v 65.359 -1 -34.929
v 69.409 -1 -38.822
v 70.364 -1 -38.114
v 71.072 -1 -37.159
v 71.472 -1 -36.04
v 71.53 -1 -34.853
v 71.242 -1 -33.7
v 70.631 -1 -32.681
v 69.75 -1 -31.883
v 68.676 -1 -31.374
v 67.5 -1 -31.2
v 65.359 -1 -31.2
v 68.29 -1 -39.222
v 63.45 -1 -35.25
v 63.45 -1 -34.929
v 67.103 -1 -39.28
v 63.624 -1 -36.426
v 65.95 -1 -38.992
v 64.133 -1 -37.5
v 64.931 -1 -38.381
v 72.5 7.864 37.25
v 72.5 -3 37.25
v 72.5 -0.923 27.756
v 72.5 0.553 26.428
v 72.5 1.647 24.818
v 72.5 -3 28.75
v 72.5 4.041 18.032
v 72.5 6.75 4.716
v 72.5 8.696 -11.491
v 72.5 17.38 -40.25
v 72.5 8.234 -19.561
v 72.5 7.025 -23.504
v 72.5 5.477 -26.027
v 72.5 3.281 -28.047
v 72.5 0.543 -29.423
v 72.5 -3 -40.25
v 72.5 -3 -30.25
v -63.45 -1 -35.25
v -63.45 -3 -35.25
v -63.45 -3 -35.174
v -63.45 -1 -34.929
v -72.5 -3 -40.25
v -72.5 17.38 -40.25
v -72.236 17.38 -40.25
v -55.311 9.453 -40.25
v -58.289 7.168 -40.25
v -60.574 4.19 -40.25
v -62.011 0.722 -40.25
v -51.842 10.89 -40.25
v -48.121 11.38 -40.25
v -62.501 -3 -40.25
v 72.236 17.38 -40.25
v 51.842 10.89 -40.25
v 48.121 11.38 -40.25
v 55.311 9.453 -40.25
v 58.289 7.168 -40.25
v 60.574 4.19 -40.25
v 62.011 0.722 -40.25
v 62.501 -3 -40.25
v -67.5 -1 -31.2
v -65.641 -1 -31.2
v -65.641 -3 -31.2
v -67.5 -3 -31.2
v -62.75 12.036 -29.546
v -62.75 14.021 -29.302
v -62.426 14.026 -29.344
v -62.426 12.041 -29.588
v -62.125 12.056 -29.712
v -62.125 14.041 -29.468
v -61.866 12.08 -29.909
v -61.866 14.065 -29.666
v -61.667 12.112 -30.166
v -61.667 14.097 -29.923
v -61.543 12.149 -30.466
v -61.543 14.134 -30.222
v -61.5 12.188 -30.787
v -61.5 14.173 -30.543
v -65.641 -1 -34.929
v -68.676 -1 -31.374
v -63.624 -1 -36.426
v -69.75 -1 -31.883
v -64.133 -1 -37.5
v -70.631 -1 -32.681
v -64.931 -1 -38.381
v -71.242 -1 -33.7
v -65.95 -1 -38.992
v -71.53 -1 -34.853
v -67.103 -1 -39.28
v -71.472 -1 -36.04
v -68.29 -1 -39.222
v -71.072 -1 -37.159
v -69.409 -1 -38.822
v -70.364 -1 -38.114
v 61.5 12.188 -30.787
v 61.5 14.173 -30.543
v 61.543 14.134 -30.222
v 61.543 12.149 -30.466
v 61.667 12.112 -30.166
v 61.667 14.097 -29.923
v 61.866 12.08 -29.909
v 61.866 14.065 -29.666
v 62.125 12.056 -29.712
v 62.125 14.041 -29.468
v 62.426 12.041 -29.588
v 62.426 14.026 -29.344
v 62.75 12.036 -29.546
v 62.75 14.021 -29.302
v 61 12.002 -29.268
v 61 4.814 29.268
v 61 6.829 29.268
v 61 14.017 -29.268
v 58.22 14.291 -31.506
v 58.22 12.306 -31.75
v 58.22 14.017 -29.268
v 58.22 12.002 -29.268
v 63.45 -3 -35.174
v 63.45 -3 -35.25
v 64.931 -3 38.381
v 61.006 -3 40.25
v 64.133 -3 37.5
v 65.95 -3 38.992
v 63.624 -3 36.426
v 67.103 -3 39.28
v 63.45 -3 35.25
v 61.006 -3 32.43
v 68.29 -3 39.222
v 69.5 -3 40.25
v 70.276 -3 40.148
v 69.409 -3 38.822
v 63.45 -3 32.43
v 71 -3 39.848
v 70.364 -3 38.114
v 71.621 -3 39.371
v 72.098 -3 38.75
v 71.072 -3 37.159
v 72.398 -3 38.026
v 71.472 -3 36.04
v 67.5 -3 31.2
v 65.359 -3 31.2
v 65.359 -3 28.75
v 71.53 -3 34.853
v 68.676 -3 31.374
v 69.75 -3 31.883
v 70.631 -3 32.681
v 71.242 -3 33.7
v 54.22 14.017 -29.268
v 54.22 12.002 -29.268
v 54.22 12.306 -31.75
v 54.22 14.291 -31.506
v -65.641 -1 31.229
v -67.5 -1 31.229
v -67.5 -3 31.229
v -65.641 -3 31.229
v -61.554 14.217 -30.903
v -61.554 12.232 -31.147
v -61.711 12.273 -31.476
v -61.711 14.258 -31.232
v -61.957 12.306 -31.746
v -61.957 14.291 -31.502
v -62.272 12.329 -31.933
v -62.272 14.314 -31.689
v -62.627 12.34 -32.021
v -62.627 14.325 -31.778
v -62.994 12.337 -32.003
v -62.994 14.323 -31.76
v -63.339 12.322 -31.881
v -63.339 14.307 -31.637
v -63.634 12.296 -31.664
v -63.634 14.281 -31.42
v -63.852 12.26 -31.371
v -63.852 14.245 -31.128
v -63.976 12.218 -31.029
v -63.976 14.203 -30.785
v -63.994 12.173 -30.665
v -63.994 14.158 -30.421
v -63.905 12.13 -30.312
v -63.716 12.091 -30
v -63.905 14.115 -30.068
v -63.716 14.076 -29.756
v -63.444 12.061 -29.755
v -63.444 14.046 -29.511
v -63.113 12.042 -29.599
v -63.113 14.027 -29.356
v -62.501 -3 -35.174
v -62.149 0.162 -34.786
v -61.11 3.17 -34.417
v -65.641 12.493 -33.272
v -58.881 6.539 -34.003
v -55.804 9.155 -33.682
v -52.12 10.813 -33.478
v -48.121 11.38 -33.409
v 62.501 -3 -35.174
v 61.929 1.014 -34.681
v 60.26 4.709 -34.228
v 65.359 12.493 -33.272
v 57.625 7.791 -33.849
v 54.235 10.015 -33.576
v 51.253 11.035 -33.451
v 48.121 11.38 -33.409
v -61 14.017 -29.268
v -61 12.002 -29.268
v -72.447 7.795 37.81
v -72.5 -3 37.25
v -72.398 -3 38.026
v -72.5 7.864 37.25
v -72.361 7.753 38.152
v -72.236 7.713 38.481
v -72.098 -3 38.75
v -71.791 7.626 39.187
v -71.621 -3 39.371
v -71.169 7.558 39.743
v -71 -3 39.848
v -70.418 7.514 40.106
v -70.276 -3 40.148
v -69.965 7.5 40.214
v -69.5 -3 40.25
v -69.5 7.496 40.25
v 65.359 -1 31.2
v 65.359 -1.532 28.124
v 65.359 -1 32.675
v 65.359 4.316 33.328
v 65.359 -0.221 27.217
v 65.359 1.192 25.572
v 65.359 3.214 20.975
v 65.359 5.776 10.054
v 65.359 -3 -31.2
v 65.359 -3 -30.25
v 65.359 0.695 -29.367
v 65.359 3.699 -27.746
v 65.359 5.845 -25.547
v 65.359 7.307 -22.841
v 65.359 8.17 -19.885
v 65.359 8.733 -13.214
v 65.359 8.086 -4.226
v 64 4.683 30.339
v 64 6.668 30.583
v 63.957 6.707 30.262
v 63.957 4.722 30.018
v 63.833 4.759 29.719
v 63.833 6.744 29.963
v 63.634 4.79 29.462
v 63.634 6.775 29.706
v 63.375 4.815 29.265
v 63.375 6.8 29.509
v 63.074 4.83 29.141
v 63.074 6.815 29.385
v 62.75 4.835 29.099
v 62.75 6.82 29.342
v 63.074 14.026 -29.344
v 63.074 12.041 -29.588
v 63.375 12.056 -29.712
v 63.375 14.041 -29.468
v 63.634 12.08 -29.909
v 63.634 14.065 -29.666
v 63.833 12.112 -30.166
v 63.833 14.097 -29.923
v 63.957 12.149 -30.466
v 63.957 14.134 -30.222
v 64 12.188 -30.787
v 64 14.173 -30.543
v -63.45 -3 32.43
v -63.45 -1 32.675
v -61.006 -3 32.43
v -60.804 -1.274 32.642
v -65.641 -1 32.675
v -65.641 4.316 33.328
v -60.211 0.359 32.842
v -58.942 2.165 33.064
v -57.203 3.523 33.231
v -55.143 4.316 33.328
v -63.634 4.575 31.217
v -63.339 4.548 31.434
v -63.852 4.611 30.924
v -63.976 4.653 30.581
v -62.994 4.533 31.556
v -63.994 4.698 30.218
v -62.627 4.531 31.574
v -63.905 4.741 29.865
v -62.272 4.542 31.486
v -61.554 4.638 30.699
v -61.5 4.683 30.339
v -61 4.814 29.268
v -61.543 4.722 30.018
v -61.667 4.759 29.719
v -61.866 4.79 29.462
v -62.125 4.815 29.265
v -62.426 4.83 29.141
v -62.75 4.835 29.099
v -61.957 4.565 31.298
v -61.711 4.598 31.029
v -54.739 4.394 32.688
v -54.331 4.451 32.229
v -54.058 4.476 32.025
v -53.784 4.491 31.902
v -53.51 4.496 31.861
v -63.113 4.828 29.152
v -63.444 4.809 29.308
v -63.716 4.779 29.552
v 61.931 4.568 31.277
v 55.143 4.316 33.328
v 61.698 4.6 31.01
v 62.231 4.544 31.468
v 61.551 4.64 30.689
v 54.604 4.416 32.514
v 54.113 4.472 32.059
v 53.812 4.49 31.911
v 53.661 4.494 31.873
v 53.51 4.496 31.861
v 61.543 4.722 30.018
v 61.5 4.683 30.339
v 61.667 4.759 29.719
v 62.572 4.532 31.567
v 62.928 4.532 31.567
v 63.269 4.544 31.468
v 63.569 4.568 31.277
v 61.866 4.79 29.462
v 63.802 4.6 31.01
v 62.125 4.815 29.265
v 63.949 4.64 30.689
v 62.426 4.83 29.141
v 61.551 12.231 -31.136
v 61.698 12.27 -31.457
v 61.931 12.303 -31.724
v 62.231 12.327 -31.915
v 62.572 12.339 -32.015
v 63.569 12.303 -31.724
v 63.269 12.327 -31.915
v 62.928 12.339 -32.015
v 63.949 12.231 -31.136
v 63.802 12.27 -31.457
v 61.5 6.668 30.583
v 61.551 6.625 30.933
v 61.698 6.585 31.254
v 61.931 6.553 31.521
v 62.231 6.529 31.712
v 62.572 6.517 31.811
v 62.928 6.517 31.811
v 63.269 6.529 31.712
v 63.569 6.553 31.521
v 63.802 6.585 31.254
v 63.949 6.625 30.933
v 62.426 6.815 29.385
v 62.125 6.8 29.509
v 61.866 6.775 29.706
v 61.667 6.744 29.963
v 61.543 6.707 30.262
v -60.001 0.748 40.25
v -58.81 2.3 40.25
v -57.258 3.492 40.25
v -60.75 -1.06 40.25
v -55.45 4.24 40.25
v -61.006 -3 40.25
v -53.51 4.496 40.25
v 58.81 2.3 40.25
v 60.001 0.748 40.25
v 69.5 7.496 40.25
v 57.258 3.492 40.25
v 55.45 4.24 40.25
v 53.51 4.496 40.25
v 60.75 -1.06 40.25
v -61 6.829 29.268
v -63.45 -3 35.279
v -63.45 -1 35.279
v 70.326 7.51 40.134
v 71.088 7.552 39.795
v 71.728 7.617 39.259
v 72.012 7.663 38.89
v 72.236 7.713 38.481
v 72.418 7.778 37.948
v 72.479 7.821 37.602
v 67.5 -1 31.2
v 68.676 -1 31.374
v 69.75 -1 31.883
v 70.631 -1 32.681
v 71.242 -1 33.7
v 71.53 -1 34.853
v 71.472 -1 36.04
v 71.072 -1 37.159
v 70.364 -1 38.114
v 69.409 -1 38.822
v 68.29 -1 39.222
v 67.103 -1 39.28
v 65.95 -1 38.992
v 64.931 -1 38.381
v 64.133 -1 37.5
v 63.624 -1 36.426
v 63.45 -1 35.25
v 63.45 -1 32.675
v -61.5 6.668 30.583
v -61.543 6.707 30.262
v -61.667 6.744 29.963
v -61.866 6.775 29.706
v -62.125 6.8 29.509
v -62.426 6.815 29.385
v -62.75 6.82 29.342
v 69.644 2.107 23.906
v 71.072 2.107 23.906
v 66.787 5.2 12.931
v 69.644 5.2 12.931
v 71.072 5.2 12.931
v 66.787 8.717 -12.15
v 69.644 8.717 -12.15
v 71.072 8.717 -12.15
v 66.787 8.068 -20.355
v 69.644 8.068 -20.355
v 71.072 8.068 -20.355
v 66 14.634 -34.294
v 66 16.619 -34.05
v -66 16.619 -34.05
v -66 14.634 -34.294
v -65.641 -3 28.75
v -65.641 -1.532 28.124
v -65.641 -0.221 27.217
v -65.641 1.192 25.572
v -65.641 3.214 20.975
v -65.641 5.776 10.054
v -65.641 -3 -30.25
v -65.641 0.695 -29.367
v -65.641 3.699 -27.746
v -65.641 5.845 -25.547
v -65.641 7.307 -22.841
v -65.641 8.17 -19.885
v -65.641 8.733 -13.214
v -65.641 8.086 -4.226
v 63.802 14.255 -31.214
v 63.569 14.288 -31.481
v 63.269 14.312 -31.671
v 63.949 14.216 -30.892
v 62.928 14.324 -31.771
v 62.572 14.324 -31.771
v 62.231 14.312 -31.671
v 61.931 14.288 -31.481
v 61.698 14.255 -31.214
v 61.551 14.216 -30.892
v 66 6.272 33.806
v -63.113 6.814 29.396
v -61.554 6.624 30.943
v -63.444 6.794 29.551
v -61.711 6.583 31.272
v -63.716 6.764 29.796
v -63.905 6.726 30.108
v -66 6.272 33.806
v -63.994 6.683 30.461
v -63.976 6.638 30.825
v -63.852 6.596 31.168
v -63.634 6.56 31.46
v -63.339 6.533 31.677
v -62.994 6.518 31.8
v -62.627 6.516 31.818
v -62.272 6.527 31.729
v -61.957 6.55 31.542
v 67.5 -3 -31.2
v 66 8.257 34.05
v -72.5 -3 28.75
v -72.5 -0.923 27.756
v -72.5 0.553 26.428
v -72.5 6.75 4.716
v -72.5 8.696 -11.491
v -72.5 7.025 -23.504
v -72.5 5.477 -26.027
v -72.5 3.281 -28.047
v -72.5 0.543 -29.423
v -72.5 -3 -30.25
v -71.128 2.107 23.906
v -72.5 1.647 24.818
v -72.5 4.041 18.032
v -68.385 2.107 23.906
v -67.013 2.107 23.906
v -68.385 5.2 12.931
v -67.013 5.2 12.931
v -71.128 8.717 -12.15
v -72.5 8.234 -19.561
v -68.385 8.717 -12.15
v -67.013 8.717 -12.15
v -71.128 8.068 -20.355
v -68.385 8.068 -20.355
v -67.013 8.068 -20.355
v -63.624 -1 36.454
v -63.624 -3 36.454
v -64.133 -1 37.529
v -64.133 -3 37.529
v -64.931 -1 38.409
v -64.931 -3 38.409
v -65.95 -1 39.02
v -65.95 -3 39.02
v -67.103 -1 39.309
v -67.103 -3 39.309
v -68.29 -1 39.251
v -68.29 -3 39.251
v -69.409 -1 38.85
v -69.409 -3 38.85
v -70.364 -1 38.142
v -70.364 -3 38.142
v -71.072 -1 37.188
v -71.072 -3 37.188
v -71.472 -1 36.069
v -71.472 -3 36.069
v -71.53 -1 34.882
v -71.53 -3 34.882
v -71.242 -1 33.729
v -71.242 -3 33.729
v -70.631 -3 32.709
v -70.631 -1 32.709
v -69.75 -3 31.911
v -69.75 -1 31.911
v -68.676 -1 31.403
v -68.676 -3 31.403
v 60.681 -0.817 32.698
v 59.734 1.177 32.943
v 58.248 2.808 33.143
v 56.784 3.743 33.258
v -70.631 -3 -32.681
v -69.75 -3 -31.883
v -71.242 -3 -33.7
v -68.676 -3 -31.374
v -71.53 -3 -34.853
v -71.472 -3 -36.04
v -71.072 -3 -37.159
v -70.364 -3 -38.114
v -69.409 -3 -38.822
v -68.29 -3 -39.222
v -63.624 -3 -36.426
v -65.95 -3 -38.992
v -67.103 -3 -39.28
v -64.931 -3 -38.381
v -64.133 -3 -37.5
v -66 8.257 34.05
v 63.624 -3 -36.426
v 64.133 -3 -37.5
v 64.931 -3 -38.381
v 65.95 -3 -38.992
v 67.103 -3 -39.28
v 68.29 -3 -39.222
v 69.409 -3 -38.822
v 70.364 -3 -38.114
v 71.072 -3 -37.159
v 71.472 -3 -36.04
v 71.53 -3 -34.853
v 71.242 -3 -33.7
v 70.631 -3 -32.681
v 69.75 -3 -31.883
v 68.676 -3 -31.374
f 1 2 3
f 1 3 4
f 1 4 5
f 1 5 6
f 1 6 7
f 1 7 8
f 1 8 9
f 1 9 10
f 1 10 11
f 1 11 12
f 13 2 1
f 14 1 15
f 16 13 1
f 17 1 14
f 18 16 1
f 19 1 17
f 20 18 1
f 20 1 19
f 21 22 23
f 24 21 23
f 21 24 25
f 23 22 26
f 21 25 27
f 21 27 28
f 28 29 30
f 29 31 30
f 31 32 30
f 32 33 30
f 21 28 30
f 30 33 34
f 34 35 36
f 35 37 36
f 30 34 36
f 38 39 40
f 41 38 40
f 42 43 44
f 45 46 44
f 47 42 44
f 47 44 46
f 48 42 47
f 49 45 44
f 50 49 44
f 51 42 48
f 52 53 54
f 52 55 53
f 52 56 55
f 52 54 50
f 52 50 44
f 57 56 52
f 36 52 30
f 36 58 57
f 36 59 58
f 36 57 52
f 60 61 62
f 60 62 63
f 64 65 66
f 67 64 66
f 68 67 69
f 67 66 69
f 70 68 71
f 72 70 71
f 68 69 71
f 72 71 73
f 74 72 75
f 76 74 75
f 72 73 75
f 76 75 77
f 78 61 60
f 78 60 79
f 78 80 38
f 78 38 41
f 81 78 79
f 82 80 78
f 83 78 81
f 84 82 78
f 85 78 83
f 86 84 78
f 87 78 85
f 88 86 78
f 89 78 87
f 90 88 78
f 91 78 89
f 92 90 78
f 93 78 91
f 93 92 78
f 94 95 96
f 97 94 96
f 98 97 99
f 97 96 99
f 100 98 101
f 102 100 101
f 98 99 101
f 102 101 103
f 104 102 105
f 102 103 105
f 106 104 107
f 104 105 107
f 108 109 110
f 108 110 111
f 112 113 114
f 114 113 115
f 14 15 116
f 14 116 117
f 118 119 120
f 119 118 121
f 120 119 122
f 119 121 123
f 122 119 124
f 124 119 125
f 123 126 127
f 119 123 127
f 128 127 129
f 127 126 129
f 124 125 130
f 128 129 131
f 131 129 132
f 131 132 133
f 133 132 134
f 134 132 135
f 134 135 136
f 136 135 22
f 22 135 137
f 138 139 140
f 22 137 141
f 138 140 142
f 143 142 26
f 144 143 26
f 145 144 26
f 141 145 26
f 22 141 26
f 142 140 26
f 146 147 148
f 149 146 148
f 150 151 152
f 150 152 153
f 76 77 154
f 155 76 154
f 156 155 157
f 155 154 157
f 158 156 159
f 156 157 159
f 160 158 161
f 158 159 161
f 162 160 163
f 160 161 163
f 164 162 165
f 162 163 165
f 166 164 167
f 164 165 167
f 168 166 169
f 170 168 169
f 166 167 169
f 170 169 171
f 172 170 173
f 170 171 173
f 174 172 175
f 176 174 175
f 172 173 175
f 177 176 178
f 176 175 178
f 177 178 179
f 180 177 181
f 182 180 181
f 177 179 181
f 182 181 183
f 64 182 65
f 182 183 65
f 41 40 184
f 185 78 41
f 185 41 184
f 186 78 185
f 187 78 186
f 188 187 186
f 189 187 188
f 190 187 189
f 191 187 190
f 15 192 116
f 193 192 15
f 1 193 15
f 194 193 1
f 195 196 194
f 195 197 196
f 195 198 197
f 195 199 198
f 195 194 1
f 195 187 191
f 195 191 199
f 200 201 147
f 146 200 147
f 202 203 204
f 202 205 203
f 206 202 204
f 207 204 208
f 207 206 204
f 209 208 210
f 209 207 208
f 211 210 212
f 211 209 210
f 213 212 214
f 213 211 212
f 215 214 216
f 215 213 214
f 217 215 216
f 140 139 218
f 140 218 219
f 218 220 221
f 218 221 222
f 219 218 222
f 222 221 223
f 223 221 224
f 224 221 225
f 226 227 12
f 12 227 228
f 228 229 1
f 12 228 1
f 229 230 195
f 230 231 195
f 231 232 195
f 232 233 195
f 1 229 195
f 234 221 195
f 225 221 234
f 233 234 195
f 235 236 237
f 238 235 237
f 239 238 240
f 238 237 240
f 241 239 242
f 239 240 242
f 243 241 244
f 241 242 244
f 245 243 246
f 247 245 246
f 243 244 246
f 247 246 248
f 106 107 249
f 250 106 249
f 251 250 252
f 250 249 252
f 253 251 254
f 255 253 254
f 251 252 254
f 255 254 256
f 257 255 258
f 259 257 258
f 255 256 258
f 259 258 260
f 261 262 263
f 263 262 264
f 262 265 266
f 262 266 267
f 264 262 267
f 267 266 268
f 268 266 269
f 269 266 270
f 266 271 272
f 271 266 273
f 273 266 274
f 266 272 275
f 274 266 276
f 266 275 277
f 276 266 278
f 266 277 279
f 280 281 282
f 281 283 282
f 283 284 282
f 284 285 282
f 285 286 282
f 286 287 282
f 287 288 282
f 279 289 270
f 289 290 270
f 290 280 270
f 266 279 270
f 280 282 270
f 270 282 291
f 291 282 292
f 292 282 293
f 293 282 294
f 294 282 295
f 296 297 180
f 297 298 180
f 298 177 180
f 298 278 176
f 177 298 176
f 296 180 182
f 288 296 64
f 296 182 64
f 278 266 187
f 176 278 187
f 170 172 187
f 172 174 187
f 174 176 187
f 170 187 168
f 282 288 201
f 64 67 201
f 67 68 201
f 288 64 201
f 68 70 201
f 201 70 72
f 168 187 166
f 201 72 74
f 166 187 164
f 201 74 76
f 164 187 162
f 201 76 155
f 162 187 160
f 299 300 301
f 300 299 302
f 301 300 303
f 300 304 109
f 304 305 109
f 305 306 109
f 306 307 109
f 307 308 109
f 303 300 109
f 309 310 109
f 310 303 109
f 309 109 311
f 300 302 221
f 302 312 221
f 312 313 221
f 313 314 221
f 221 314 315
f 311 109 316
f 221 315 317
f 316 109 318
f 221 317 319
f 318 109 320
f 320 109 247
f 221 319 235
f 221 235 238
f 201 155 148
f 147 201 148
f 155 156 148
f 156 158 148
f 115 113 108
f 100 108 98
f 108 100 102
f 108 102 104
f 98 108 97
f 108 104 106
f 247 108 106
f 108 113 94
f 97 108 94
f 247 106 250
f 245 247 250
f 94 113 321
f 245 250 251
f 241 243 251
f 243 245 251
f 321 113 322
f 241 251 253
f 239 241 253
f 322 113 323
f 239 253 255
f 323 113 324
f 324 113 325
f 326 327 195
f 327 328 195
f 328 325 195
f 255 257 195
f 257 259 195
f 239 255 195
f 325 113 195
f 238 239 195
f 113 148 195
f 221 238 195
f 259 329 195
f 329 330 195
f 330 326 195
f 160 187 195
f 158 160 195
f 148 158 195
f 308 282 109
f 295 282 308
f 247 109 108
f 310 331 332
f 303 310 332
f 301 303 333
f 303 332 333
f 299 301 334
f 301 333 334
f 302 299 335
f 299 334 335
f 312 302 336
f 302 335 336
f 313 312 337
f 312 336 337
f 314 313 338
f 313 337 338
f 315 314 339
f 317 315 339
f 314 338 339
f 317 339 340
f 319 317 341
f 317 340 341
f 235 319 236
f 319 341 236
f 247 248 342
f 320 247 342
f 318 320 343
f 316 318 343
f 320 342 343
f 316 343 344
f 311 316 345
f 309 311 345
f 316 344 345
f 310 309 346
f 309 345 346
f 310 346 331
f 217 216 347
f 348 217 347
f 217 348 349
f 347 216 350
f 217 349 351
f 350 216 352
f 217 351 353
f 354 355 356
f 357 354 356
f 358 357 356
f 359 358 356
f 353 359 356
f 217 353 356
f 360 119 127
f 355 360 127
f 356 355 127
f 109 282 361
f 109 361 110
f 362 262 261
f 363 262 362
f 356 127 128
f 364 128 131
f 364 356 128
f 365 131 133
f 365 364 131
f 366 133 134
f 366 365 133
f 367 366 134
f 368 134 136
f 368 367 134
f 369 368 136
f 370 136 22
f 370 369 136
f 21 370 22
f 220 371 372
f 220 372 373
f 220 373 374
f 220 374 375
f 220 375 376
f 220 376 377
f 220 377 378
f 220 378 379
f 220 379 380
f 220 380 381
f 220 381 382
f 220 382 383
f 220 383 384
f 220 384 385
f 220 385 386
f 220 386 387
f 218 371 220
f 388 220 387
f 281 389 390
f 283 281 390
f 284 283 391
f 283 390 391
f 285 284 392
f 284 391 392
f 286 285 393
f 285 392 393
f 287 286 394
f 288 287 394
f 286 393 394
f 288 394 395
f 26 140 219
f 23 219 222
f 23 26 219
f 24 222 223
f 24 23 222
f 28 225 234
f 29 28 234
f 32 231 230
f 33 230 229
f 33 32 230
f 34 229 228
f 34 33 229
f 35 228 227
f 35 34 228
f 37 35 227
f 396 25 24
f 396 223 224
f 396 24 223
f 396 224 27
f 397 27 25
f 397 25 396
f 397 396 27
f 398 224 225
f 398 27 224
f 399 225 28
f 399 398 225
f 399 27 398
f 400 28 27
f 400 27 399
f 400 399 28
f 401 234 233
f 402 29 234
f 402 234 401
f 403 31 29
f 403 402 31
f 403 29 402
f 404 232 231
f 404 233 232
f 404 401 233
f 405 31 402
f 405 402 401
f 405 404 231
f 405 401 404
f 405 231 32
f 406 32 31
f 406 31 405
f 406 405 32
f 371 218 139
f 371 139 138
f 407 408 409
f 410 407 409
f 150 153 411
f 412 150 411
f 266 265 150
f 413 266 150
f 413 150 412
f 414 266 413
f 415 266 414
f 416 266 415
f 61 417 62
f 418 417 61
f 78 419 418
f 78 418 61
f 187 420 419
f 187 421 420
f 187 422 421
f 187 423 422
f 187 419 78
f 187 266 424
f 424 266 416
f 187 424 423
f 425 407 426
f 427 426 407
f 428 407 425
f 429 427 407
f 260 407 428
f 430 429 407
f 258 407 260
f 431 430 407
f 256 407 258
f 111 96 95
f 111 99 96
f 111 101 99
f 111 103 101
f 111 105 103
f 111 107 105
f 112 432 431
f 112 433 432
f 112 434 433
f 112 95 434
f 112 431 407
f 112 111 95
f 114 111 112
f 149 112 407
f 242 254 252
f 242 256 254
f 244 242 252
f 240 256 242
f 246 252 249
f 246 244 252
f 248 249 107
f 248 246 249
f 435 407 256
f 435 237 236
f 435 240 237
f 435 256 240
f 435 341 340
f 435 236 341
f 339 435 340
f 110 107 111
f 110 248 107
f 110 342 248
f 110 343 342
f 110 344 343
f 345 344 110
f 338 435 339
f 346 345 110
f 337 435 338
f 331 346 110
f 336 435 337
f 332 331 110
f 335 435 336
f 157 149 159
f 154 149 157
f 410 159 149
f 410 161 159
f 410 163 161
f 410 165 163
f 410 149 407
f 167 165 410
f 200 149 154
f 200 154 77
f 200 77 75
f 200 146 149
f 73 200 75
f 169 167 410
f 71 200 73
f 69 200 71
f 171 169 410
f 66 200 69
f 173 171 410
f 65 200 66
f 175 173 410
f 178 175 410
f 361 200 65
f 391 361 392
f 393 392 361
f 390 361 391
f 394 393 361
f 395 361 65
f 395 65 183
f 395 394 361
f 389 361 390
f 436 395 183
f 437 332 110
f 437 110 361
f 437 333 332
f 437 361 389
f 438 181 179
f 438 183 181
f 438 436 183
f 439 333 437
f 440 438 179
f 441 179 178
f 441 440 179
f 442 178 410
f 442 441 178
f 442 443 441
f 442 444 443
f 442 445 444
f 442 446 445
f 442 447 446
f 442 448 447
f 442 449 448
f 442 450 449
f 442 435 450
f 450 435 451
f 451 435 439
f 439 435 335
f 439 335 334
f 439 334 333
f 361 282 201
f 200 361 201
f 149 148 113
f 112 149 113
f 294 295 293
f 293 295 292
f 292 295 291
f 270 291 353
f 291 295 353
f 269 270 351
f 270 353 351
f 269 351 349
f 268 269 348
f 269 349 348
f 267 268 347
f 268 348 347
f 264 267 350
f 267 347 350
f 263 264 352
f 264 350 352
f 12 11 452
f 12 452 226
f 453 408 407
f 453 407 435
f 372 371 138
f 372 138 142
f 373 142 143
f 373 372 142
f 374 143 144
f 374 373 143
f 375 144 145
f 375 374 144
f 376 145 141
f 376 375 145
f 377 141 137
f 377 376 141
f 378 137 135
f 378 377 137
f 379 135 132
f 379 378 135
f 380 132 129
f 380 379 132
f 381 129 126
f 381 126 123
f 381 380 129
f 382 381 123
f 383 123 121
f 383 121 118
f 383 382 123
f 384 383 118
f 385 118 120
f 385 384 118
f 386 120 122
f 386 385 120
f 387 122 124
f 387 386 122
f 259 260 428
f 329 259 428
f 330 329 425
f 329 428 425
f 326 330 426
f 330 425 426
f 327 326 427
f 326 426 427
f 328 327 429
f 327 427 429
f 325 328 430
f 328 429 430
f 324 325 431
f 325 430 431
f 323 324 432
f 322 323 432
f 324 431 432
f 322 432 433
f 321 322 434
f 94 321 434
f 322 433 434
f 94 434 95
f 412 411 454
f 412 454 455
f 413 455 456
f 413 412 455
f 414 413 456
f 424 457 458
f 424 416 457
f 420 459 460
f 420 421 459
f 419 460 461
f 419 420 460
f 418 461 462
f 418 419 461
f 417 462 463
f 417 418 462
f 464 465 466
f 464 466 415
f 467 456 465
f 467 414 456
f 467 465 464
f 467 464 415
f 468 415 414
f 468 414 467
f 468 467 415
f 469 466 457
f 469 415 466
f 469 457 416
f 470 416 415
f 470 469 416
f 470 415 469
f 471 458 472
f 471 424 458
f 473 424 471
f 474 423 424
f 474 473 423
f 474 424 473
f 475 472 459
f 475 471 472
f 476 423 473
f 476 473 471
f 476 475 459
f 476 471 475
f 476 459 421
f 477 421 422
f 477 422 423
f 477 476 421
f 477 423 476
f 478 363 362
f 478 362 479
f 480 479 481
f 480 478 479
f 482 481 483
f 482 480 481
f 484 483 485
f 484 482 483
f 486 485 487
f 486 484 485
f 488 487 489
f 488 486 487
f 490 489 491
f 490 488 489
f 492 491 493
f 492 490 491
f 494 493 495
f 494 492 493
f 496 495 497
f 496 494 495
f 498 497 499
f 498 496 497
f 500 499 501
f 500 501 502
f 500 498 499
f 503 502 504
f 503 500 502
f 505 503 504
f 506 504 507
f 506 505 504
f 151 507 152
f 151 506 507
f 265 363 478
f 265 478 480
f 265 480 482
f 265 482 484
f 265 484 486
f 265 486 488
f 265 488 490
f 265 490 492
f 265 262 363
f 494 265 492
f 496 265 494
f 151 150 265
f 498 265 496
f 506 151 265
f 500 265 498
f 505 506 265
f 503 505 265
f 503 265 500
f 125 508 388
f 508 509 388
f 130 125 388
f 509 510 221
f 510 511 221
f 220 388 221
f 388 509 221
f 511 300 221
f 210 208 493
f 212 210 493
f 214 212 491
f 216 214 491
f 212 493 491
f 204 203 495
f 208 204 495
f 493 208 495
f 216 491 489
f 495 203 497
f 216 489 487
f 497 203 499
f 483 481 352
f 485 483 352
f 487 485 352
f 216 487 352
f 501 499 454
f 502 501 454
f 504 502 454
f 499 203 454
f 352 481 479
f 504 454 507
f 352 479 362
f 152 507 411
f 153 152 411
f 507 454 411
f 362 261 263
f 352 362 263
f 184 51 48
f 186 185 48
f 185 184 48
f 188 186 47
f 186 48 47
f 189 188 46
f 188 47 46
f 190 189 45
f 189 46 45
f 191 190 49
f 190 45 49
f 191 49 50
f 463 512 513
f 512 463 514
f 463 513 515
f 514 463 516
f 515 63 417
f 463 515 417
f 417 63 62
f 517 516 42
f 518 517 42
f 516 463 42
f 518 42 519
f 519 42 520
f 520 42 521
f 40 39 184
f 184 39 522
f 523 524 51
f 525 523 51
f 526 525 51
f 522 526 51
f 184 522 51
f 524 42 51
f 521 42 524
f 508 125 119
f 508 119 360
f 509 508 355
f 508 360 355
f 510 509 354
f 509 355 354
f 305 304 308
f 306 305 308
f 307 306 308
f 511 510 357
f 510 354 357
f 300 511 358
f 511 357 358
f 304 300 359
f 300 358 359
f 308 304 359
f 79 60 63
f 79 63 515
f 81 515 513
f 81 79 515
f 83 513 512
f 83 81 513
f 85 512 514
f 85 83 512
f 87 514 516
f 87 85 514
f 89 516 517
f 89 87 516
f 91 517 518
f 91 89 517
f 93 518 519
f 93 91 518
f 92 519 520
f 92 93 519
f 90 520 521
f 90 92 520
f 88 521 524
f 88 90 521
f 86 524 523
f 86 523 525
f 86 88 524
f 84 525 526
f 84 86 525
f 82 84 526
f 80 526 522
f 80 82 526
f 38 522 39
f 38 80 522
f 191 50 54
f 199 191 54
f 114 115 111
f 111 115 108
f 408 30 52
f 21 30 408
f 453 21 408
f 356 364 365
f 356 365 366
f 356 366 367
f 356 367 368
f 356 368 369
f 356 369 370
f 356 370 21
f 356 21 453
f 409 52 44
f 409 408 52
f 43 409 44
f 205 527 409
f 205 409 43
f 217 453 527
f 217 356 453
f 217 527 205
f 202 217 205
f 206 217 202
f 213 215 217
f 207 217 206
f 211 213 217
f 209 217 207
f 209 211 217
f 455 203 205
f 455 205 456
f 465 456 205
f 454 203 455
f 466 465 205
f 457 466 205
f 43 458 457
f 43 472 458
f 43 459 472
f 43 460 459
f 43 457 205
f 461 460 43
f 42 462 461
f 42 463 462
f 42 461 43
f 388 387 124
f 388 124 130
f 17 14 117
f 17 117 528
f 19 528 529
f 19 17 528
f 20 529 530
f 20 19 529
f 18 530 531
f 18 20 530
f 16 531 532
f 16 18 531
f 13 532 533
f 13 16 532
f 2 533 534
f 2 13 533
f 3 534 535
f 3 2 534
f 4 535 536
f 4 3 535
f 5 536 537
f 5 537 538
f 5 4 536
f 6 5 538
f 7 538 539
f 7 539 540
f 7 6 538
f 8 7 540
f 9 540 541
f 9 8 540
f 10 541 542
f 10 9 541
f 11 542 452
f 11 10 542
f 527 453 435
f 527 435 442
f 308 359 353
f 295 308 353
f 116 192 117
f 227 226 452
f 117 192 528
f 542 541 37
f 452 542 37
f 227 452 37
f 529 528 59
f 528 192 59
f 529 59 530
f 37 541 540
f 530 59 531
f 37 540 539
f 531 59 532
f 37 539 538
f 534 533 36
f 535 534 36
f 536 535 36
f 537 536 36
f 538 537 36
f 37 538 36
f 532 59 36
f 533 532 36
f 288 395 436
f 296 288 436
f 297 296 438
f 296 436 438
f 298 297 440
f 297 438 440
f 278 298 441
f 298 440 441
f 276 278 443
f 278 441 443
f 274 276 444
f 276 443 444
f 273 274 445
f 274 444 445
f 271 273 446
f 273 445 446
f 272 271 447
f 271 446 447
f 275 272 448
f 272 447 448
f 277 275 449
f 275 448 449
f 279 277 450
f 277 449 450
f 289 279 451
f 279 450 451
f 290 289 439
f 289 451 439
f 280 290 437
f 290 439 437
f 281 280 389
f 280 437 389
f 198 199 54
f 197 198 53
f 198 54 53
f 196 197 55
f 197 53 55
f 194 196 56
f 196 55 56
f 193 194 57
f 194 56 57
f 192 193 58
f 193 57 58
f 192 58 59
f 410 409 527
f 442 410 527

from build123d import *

# Parameters (mm, degrees)
BOSS_EXTRUDE1_DEPTH       = 17.38
BOSS_EXTRUDE1_DEPTH_BACK  = 3
SKETCH1_W                 = 145
SKETCH1_H                 = 80.5
SKETCH1_W_2               = 132
SKETCH1_H_2               = 68.1
SKETCH2_W                 = 145.621836594
SKETCH2_H                 = 81.229894902
CUT_EXTRUDE1_DEPTH        = 10.38
FILLET1_R                 = 3
BOSS_EXTRUDE17_DEPTH      = 17.38
BOSS_EXTRUDE17_DEPTH_BACK = 3
SKETCH5_W                 = 132
SKETCH5_H                 = 68.1
SKETCH5_W_2               = 122
SKETCH5_H_2               = 58.53632086
SKETCH9_W                 = 144.471640976
SKETCH9_H                 = 84.136143584
CUT_EXTRUDE5_DEPTH        = 9.6
SKETCH6_W                 = 132
SKETCH6_H                 = 68.611419114
CUT_EXTRUDE6_DEPTH        = 2
CUT_EXTRUDE9_DEPTH        = 10.7
CUT_EXTRUDE12_START       = -145
CUT_EXTRUDE12_DEPTH       = 145
CUT_EXTRUDE13_DEPTH       = 10
SKETCH21_W                = 131
SKETCH21_H                = 67.1
CUT_EXTRUDE14_DEPTH       = 30
CUT_EXTRUDE15_START       = -2
CUT_EXTRUDE15_DEPTH       = 2
CUT_EXTRUDE17_DEPTH       = 10
CUT_EXTRUDE18_DEPTH       = 10


# Read off the part's stored shape, not the designer's step: Cut-Extrude12, Cut-Extrude15
with BuildPart() as part:
    # Sketch1 → Boss-Extrude1 (new, two sides: drawn at the far end of the back side and taken through both)
    with BuildSketch(Plane(origin=(0, 0, 0), x_dir=(1, 0, 0), z_dir=(0, 1, 0)).offset(-BOSS_EXTRUDE1_DEPTH_BACK)):
        Rectangle(SKETCH1_W, SKETCH1_H)
        Rectangle(SKETCH1_W_2, SKETCH1_H_2, mode=Mode.SUBTRACT)
    extrude(amount=BOSS_EXTRUDE1_DEPTH + BOSS_EXTRUDE1_DEPTH_BACK)

    # Sketch2 → Cut-Extrude1 (cut)
    with BuildSketch(Plane(origin=(0, 12.253191712, 1.504502764), x_dir=(-1, 0, 0), z_dir=(0, 0.9925461516413239, 0.12186934340513403))):
        with Locations((0.310918297, -1.453124341)):
            Rectangle(SKETCH2_W, SKETCH2_H)
    extrude(amount=CUT_EXTRUDE1_DEPTH, mode=Mode.SUBTRACT)

    # Fillet1
    fillet1_edges = [part.edges().sort_by_distance(p)[0] for p in [
        (72.5, 2.247921424, 40.25),
        (-72.5, 2.247921424, 40.25),
    ]]
    fillet(fillet1_edges, radius=FILLET1_R)

    # Sketch5 → Boss-Extrude17 (add, two sides: drawn at the far end of the back side and taken through both)
    with BuildSketch(Plane(origin=(0, 0, 0), x_dir=(1, 0, 0), z_dir=(0, 1, 0)).offset(-BOSS_EXTRUDE17_DEPTH_BACK)):
        Rectangle(SKETCH5_W, SKETCH5_H)
        Rectangle(SKETCH5_W_2, SKETCH5_H_2, mode=Mode.SUBTRACT)
    extrude(amount=BOSS_EXTRUDE17_DEPTH + BOSS_EXTRUDE17_DEPTH_BACK)

    # Sketch9 → Cut-Extrude5 (cut)
    with BuildSketch(Plane(origin=(0, 12.253191712, 1.504502764), x_dir=(1, 0, 0), z_dir=(0, 0.9925461516413238, 0.12186934340513406))):
        Rectangle(SKETCH9_W, SKETCH9_H)
    extrude(amount=CUT_EXTRUDE5_DEPTH, mode=Mode.SUBTRACT)

    # Sketch6 → Cut-Extrude6 (cut)
    with BuildSketch(Plane(origin=(0, 12.253191712, 1.504502764), x_dir=(-1, 0, 0), z_dir=(0, 0.9925461516413239, 0.12186934340513403))):
        with Locations((0, -1.515801317)):
            Rectangle(SKETCH6_W, SKETCH6_H)
    extrude(amount=-CUT_EXTRUDE6_DEPTH, mode=Mode.SUBTRACT)

    # Sketch12 → Cut-Extrude9 (cut)
    with BuildSketch(Plane(origin=(0, 0, -40.25), x_dir=(-1, 0, 0), z_dir=(0, 0, -1))):
        with BuildLine():
            Line((62.5, -3), (62.500586031, -3))
            ThreePointArc((62.500586031, -3), (58.288781544, 7.168195513), (48.120586031, 11.38))
            Line((48.120586031, 11.38), (0, 11.38))
            Line((0, 11.38), (-48.120586031, 11.38))
            ThreePointArc((-48.120586031, 11.38), (-58.288781544, 7.168195513), (-62.500586031, -3))
            Line((-62.500586031, -3), (62.5, -3))
        make_face()
    extrude(amount=-CUT_EXTRUDE9_DEPTH, mode=Mode.SUBTRACT)

    # Cut-Extrude12 outline → Cut-Extrude12 (cut)
    with BuildSketch(Plane.ZY.offset(72.5).offset(CUT_EXTRUDE12_START)):
        with BuildLine():
            Line((-30.25, -3), (28.75, -3))
            add(Edge.make_bspline(
                [(28.75, -3), (26.32968346, 4.271531969), (19.440941834, 4.451750453), (-1.874181617, 6.089281656), (-27.421780079, 18.432975247), (-30.25, -3)],
                knots=[0.042214979, 0.042214979, 0.042214979, 0.042214979, 0.042214979, 0.042214979, 1.042214979, 1.042214979, 1.042214979, 1.042214979, 1.042214979, 1.042214979], degree=5))
        make_face()
    extrude(amount=CUT_EXTRUDE12_DEPTH, mode=Mode.SUBTRACT)

    # Sketch19 → Cut-Extrude13 (cut)
    with BuildSketch(Plane(origin=(0, 10.268099409, 1.260764077), x_dir=(1, 0, 0), z_dir=(0, 0.9925461516413238, 0.12186934340513403))):
        with BuildLine():
            ThreePointArc((61.5, 32.0425), (61.866116524, 31.158616524), (62.75, 30.7925))
            Line((62.75, 30.7925), (62.75, 32.0425))
            Line((62.75, 32.0425), (61.5, 32.0425))
        make_face()
        with BuildLine():
            Line((62.75, 32.0425), (62.75, 30.7925))
            ThreePointArc((62.75, 30.7925), (63.633883476, 31.158616524), (64, 32.0425))
            ThreePointArc((64, 32.0425), (62.75, 33.2925), (61.5, 32.0425))
            Line((61.5, 32.0425), (62.75, 32.0425))
        make_face()
        with BuildLine():
            ThreePointArc((64, -29.5425), (63.633883476, -28.658616524), (62.75, -28.2925))
            Line((62.75, -28.2925), (62.75, -29.5425))
            Line((62.75, -29.5425), (61.5, -29.5425))
            ThreePointArc((61.5, -29.5425), (62.75, -30.7925), (64, -29.5425))
        make_face()
        with BuildLine():
            Line((62.75, -29.5425), (62.75, -28.2925))
            ThreePointArc((62.75, -28.2925), (61.866116524, -28.658616524), (61.5, -29.5425))
            Line((61.5, -29.5425), (62.75, -29.5425))
        make_face()
        with BuildLine():
            ThreePointArc((-61.5, -29.5425), (-61.866116524, -28.658616524), (-62.75, -28.2925))
            Line((-62.75, -28.2925), (-62.75, -29.5425))
            Line((-62.75, -29.5425), (-61.5, -29.5425))
        make_face()
        with BuildLine():
            Line((-62.75, -29.5425), (-62.75, -28.2925))
            ThreePointArc((-62.75, -28.2925), (-63.633883476, -30.426383476), (-61.5, -29.5425))
            Line((-61.5, -29.5425), (-62.75, -29.5425))
        make_face()
        with BuildLine():
            ThreePointArc((-61.5, 32.0425), (-63.633883476, 32.926383476), (-62.75, 30.7925))
            Line((-62.75, 30.7925), (-62.75, 32.0425))
            Line((-62.75, 32.0425), (-61.5, 32.0425))
        make_face()
        with BuildLine():
            Line((-62.75, 32.0425), (-62.75, 30.7925))
            ThreePointArc((-62.75, 30.7925), (-61.866116524, 31.158616524), (-61.5, 32.0425))
            Line((-61.5, 32.0425), (-62.75, 32.0425))
        make_face()
    extrude(amount=-CUT_EXTRUDE13_DEPTH, mode=Mode.SUBTRACT)

    # Sketch21 → Cut-Extrude14 (cut)
    with BuildSketch(Plane(origin=(0, 8.283007106, 1.01702539), x_dir=(1, 0, 0), z_dir=(0, 0.9925461516413238, 0.12186934340513403))):
        with Locations((-0.141032576, 0.996407471)):
            Rectangle(SKETCH21_W, SKETCH21_H)
    extrude(amount=-CUT_EXTRUDE14_DEPTH, mode=Mode.SUBTRACT)

    # Cut-Extrude15 outline → Cut-Extrude15 (cut)
    with BuildSketch(Plane(origin=(0, -3, 0), x_dir=(-1, 0, 0), z_dir=(0, -1, 0)).offset(CUT_EXTRUDE15_START)):
        with BuildLine():
            Line((67.499992595, -31.228634541), (63.449992595, -31.228634541))
            Line((63.449992595, -31.228634541), (63.449992595, -35.278634541))
            ThreePointArc((63.449992595, -35.278634541), (70.363775058, -38.142417005), (67.499992595, -31.228634541))
        make_face()
        with BuildLine():
            Line((63.449999996, 31.2), (67.499999996, 31.2))
            ThreePointArc((67.499999996, 31.2), (70.363782459, 38.113782464), (63.449999996, 35.25))
            Line((63.449999996, 35.25), (63.449999996, 31.2))
        make_face()
        with BuildLine():
            Line((-67.5, 31.2), (-63.45, 31.2))
            Line((-63.45, 31.2), (-63.45, 35.25))
            ThreePointArc((-63.45, 35.25), (-70.363782464, 38.113782464), (-67.5, 31.2))
        make_face()
        with BuildLine():
            Line((-63.45, -31.2), (-67.5, -31.2))
            ThreePointArc((-67.5, -31.2), (-70.363782464, -38.113782464), (-63.45, -35.25))
            Line((-63.45, -35.25), (-63.45, -31.2))
        make_face()
    extrude(amount=CUT_EXTRUDE15_DEPTH, mode=Mode.SUBTRACT)

    # Sketch25 → Cut-Extrude17 (cut)
    with BuildSketch(Plane(origin=(0, 8.283007106, 1.01702539), x_dir=(1, 0, 0), z_dir=(0, -0.9925461516413238, -0.1218693434051341))):
        Polygon((58.22, -33.01262228), (58.22, -32.0425), (58.22, -30.51262228), (54.22, -30.51262228), (54.22, -33.01262228), align=None)
    extrude(amount=-CUT_EXTRUDE17_DEPTH, mode=Mode.SUBTRACT)

    # Sketch26 → Cut-Extrude18 (cut)
    with BuildSketch(Plane.XY.offset(40.25)):
        with BuildLine():
            ThreePointArc((-53.509718644, 4.495842847), (-58.810079952, 2.300361308), (-61.005561492, -3))
            Line((-61.005561492, -3), (-61, -3))
            Line((-61, -3), (59.5, -3))
            Line((59.5, -3), (61.005561492, -3))
            ThreePointArc((61.005561492, -3), (58.810079952, 2.300361308), (53.509718644, 4.495842847))
            Line((53.509718644, 4.495842847), (53.241634956, 4.495842847))
            Line((53.241634956, 4.495842847), (0, 4.495842847))
            Line((0, 4.495842847), (-53.509718644, 4.495842847))
        make_face()
    extrude(amount=-CUT_EXTRUDE18_DEPTH, mode=Mode.SUBTRACT)


solid = part.part
